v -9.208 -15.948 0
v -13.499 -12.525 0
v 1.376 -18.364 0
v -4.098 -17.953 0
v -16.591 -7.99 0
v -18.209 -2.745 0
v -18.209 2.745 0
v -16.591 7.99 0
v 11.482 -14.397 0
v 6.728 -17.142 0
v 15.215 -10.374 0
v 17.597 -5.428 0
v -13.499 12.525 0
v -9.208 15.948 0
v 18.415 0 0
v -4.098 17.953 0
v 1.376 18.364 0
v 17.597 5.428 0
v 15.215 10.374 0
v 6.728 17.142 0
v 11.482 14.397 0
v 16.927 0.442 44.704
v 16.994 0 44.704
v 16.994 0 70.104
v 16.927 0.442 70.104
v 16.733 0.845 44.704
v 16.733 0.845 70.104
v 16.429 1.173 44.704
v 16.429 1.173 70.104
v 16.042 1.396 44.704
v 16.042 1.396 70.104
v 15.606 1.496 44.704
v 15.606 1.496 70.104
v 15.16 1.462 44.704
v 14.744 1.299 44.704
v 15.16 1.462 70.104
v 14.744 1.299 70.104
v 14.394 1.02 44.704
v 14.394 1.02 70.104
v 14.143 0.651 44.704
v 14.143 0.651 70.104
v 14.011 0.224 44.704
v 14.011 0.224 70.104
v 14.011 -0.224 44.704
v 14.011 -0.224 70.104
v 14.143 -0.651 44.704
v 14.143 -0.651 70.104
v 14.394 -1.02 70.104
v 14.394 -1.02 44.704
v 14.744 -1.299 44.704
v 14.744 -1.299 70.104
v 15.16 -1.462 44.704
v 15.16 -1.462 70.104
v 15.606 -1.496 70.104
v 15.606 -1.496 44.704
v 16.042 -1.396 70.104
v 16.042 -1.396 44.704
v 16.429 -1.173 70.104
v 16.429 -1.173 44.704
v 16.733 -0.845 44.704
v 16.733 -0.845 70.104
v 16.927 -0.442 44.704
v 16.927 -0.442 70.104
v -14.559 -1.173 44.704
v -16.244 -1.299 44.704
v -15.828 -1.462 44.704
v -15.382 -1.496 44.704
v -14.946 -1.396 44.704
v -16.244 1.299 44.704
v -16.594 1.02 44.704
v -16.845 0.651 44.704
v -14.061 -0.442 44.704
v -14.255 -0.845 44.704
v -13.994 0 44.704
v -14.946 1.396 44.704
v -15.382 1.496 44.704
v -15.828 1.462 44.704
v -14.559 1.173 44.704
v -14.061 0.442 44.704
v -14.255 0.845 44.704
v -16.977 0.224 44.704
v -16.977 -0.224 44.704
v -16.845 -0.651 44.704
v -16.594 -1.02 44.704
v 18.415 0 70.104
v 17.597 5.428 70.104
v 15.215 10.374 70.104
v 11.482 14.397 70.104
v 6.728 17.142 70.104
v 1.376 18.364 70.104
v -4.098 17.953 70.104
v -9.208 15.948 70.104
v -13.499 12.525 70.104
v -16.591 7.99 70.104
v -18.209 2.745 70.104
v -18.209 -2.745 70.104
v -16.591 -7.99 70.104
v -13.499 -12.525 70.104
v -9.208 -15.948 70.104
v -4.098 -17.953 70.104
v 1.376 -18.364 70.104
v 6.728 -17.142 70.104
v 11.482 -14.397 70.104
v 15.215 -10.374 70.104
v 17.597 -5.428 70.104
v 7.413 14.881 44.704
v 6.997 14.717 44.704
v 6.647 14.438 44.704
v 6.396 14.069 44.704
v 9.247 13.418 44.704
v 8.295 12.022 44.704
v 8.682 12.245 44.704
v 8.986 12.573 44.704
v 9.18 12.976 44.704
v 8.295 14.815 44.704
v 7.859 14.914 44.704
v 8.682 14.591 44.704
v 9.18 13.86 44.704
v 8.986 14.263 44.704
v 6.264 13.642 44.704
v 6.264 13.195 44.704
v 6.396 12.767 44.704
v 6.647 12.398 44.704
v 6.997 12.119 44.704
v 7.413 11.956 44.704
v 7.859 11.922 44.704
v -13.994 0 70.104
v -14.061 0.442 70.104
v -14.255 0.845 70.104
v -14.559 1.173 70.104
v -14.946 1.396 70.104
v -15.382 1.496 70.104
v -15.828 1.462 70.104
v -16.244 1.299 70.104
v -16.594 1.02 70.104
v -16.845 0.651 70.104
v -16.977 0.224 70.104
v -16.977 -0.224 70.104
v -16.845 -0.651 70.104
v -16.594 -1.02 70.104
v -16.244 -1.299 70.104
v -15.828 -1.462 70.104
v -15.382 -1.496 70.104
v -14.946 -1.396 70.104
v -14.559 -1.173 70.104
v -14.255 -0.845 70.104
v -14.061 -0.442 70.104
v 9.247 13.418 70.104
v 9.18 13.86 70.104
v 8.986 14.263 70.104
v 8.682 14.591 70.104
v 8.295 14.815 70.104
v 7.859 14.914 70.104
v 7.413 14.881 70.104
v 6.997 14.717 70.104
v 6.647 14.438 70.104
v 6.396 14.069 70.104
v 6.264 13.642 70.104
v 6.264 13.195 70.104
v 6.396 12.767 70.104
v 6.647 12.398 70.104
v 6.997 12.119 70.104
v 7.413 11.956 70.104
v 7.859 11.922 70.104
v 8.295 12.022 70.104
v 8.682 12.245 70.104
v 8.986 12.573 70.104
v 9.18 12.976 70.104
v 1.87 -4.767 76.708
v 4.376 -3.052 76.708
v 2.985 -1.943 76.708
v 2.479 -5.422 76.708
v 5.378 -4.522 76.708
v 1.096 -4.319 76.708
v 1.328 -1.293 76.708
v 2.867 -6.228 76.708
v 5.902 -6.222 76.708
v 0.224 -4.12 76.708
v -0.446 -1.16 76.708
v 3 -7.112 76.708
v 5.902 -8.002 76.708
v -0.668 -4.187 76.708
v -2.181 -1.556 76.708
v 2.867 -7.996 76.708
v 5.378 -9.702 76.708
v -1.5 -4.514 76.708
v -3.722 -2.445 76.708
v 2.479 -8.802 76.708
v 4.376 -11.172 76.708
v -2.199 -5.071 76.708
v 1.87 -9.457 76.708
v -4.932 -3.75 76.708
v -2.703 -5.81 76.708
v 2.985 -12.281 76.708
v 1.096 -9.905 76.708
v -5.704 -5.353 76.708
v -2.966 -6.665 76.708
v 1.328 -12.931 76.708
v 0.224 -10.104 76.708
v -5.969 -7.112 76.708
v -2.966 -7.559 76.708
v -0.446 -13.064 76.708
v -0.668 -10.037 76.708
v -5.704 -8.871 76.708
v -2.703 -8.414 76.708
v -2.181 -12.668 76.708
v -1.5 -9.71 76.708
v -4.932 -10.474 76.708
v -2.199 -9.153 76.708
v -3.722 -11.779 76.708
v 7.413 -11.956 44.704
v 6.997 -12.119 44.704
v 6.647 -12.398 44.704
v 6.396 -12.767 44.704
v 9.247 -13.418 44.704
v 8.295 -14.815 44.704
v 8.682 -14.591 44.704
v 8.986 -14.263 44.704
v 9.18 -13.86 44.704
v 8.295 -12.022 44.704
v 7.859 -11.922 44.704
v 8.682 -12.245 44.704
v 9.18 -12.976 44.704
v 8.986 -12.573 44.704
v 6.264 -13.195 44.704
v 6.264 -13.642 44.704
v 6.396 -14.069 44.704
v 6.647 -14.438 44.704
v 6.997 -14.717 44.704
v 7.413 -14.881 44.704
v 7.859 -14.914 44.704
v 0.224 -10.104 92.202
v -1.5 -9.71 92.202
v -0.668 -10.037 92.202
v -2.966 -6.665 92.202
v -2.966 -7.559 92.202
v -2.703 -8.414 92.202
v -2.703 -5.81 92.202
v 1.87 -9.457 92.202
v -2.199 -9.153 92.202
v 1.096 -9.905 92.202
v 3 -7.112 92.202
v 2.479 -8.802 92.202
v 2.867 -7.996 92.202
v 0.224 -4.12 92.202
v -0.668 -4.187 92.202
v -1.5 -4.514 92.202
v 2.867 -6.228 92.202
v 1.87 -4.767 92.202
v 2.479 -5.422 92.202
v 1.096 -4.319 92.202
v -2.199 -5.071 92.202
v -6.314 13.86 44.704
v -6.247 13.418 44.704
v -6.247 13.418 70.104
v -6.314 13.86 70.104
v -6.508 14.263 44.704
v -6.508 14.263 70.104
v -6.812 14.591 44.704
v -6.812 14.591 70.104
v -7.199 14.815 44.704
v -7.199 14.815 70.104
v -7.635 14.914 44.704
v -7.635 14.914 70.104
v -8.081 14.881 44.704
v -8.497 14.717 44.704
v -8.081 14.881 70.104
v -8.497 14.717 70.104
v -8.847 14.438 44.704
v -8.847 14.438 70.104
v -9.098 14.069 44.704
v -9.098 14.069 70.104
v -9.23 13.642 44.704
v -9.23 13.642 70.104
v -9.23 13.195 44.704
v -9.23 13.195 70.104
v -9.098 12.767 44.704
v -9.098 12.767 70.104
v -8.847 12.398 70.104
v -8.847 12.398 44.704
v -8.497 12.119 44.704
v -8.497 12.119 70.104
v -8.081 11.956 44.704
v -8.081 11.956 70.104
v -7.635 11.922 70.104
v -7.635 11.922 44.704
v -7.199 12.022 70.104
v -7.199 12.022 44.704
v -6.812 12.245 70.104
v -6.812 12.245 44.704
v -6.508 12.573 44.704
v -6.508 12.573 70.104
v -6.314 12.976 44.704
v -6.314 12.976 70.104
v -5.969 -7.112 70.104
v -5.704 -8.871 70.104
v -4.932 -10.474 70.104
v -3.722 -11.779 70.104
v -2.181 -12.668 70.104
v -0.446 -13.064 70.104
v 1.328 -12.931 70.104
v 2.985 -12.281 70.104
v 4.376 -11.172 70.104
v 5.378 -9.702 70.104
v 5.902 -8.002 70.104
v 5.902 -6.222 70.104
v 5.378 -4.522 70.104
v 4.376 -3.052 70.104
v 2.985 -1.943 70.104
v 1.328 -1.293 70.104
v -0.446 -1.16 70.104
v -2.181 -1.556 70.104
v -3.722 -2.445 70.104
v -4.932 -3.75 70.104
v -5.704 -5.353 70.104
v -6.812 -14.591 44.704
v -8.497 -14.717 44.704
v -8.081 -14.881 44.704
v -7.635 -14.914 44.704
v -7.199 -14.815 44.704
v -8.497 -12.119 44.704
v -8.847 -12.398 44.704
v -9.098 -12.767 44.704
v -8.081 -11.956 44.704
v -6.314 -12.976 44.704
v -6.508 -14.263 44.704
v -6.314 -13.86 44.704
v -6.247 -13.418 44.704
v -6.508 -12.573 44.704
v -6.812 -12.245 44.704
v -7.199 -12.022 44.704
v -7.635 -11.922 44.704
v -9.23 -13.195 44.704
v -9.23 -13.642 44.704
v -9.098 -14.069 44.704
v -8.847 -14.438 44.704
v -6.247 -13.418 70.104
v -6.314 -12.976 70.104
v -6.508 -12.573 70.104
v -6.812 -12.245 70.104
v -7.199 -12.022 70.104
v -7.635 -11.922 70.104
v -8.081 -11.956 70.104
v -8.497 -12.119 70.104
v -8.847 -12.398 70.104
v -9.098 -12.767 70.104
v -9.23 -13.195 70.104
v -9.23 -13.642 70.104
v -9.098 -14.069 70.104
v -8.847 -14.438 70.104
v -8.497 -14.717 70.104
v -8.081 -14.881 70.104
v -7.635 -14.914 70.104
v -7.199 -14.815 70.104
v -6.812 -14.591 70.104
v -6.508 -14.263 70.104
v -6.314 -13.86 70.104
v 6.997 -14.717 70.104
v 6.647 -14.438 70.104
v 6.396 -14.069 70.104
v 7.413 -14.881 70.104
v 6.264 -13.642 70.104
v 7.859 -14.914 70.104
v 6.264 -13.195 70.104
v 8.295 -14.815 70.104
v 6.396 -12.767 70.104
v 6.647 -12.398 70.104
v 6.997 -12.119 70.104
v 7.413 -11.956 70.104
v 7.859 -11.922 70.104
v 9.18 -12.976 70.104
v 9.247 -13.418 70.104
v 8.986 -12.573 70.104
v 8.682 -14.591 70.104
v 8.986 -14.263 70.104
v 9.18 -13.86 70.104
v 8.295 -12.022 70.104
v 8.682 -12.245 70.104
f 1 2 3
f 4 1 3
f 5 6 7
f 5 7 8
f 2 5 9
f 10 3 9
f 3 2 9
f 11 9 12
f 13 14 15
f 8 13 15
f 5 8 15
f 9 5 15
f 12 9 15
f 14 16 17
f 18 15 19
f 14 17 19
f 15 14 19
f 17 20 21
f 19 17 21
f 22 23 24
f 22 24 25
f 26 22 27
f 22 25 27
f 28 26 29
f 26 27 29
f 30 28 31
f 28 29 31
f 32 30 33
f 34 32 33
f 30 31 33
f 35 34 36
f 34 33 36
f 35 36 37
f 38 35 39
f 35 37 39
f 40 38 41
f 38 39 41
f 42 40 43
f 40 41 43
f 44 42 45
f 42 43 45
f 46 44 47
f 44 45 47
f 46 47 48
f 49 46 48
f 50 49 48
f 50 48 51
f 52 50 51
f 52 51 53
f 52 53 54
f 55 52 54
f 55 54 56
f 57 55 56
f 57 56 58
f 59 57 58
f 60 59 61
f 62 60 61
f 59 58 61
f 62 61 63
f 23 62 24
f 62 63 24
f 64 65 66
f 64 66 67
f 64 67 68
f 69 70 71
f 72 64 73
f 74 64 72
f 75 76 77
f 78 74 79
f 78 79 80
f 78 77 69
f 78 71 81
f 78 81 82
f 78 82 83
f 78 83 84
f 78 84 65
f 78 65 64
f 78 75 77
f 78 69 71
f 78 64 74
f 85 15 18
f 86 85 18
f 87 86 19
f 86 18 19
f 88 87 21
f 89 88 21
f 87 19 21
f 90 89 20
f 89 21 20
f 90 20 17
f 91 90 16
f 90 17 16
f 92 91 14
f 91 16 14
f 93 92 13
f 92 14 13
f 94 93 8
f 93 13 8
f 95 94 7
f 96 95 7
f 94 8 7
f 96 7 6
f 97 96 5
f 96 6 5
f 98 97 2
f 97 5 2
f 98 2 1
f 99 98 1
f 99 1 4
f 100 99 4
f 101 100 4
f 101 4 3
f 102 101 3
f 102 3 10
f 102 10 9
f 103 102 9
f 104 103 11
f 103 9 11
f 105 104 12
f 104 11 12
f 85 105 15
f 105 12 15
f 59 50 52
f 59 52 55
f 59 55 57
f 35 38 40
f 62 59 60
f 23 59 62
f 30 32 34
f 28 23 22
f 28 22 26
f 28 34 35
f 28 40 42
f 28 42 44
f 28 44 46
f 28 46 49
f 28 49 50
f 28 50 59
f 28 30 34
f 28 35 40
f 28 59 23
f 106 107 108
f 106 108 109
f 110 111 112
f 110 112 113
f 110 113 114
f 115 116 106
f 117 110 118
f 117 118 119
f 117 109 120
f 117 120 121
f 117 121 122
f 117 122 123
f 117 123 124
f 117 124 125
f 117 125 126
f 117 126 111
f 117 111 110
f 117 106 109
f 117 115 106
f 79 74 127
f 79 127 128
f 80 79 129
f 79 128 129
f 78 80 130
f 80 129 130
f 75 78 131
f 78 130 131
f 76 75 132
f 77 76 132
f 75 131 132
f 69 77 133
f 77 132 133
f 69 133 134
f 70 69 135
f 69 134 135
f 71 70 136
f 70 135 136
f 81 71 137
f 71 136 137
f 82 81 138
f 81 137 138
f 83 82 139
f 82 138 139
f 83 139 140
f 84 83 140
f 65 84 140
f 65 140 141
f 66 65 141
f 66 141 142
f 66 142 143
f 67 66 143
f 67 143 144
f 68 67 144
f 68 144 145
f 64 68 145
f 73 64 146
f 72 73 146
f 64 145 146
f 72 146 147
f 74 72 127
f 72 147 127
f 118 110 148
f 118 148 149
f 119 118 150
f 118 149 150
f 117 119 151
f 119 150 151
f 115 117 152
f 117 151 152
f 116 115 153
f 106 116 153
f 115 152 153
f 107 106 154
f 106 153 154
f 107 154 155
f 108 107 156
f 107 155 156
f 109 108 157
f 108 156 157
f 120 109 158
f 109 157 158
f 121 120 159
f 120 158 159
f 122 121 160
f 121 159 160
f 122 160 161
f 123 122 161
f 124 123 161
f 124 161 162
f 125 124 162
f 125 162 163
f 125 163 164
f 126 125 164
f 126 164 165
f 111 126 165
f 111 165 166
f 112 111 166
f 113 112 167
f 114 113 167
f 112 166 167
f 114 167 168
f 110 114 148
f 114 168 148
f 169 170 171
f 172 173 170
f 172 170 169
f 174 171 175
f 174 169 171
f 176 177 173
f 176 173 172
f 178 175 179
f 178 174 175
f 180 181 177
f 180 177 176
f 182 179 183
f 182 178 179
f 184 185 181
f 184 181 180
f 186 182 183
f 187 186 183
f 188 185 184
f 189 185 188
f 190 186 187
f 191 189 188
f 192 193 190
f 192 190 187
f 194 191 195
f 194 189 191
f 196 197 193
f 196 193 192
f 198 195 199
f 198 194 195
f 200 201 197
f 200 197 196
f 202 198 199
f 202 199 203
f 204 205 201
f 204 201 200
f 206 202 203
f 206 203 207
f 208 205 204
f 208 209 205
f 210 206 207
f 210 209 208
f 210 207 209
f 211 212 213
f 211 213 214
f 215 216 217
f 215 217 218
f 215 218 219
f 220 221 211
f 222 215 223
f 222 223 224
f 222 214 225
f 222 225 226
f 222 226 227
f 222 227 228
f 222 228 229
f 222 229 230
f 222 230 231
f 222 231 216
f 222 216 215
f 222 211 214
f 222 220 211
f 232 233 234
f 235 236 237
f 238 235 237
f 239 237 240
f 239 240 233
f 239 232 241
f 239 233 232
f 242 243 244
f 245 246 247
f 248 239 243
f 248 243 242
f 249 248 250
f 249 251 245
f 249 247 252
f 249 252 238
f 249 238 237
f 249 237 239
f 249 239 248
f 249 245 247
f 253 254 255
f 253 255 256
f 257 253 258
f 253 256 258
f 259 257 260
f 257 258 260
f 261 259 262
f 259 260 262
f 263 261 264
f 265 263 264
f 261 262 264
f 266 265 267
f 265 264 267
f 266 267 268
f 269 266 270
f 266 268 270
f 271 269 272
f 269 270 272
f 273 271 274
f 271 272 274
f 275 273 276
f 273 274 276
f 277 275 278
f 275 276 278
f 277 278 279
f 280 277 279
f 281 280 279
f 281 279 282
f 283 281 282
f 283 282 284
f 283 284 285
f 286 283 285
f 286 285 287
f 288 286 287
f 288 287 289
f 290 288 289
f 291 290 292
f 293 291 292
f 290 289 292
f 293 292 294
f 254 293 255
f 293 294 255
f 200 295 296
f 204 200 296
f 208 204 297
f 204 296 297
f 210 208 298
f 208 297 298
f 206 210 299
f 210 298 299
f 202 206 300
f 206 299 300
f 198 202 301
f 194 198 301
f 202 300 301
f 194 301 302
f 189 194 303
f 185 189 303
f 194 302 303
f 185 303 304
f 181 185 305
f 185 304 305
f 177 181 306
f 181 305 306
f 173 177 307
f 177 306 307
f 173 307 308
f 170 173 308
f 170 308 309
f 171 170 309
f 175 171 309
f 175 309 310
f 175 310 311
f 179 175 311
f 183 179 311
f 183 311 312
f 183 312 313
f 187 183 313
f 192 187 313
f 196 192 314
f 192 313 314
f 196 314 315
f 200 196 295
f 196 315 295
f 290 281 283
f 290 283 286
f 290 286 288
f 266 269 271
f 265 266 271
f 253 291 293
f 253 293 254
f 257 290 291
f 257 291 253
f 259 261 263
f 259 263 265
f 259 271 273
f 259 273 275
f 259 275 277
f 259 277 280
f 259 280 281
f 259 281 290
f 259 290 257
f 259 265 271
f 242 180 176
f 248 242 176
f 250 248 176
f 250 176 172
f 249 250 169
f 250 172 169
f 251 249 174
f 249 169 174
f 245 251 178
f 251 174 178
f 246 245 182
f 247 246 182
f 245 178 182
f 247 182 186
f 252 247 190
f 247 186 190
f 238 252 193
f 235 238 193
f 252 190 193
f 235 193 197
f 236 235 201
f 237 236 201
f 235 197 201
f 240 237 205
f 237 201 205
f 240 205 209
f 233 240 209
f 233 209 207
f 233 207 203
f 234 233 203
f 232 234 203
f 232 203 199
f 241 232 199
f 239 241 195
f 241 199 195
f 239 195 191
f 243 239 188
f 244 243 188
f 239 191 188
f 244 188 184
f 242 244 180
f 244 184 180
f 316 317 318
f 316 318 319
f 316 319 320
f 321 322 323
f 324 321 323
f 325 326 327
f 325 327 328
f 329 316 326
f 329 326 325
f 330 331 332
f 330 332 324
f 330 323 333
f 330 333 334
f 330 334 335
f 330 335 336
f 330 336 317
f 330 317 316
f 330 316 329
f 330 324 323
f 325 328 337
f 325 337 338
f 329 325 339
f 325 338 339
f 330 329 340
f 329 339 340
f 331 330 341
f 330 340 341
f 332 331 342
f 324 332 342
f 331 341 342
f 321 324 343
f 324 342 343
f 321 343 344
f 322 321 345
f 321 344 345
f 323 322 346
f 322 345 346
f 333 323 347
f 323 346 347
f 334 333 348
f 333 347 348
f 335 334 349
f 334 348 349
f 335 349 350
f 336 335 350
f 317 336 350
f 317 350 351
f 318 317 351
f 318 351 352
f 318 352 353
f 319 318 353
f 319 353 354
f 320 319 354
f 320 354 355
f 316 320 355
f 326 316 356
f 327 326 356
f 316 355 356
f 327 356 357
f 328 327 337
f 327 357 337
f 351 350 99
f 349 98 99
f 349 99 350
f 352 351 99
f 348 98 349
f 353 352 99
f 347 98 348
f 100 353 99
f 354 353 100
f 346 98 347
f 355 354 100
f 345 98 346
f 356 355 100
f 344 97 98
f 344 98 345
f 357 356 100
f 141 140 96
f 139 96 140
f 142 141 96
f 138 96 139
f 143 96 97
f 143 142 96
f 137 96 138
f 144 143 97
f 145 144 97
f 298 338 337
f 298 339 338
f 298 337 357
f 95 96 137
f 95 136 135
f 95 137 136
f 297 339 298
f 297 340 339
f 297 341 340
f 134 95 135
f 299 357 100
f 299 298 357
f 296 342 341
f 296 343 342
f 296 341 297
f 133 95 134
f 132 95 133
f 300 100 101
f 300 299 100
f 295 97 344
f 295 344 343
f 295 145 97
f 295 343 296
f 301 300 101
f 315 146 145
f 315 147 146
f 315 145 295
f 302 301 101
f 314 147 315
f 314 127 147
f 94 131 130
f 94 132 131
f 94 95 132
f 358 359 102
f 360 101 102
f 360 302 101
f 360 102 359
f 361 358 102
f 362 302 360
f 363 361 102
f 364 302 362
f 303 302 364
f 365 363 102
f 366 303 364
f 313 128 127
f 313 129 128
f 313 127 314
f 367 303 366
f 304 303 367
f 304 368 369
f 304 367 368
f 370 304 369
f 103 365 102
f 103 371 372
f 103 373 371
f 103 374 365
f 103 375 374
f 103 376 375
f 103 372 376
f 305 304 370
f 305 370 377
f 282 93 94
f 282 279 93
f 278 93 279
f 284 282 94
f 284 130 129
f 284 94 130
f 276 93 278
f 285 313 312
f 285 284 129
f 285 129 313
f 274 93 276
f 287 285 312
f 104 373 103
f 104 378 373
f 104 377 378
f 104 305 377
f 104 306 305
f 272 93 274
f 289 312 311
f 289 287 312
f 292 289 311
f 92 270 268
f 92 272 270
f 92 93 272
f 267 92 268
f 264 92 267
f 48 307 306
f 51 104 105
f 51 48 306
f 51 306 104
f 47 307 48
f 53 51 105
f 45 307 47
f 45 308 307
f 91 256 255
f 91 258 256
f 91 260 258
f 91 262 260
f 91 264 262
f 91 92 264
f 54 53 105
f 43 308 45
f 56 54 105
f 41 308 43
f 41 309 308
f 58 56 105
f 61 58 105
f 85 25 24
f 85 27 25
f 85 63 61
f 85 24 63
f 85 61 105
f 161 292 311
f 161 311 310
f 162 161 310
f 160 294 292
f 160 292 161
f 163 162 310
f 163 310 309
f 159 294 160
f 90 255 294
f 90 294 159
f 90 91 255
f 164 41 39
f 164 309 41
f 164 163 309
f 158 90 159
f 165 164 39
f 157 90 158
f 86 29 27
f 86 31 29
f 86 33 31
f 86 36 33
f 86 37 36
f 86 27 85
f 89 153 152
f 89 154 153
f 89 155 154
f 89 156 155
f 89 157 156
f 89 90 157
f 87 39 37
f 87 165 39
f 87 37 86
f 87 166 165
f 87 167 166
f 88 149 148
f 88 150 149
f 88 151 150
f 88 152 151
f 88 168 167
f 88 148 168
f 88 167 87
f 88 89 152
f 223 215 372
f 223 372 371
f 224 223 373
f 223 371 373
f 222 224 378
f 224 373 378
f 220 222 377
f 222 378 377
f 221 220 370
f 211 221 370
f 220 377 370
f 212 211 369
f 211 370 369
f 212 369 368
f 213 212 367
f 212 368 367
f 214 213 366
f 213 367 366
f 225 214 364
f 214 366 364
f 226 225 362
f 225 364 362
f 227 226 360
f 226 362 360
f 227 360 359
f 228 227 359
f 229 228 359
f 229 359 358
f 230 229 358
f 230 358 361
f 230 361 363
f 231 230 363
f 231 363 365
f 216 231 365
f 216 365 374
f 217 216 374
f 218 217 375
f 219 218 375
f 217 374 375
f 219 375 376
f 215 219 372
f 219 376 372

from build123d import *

# Parameters (mm, degrees)
SKETCH1_R           = 18.415
BOSS_EXTRUDE1_DEPTH = 70.104
SKETCH2_R           = 5.969
BOSS_EXTRUDE2_DEPTH = 6.604
SKETCH3_R           = 3
BOSS_EXTRUDE3_DEPTH = 15.494
SKETCH4_R           = 1.5
CUT_EXTRUDE1_DEPTH  = 25.4


with BuildPart() as part:
    # Sketch1 → Boss-Extrude1 (new body)
    with BuildSketch(Plane.XY):
        Circle(SKETCH1_R)
    extrude(amount=BOSS_EXTRUDE1_DEPTH)

    # Sketch2 → Boss-Extrude2 (add)
    with BuildSketch(Plane.XY.offset(70.104)):
        with Locations(Location((0, -7.112, 0), (0, 0, 180))):
            Circle(SKETCH2_R)
    extrude(amount=BOSS_EXTRUDE2_DEPTH)

    # Sketch3 → Boss-Extrude3 (add)
    with BuildSketch(Plane.XY.offset(76.708)):
        with Locations((0, -7.112)):
            Circle(SKETCH3_R)
    extrude(amount=BOSS_EXTRUDE3_DEPTH)

    # Sketch4 → Cut-Extrude1 (cut)
    with BuildSketch(Plane.XY.offset(70.104)):
        with Locations((-15.494, 0)):
            Circle(SKETCH4_R)
        with Locations((15.494, 0)):
            Circle(SKETCH4_R)
        with Locations((7.747, 13.418197606)):
            Circle(SKETCH4_R)
        with Locations((-7.747, 13.418197606)):
            Circle(SKETCH4_R)
        with Locations((-7.747, -13.418197606)):
            Circle(SKETCH4_R)
        with Locations((7.747, -13.418197606)):
            Circle(SKETCH4_R)
    extrude(amount=-CUT_EXTRUDE1_DEPTH, mode=Mode.SUBTRACT)


solid = part.part
